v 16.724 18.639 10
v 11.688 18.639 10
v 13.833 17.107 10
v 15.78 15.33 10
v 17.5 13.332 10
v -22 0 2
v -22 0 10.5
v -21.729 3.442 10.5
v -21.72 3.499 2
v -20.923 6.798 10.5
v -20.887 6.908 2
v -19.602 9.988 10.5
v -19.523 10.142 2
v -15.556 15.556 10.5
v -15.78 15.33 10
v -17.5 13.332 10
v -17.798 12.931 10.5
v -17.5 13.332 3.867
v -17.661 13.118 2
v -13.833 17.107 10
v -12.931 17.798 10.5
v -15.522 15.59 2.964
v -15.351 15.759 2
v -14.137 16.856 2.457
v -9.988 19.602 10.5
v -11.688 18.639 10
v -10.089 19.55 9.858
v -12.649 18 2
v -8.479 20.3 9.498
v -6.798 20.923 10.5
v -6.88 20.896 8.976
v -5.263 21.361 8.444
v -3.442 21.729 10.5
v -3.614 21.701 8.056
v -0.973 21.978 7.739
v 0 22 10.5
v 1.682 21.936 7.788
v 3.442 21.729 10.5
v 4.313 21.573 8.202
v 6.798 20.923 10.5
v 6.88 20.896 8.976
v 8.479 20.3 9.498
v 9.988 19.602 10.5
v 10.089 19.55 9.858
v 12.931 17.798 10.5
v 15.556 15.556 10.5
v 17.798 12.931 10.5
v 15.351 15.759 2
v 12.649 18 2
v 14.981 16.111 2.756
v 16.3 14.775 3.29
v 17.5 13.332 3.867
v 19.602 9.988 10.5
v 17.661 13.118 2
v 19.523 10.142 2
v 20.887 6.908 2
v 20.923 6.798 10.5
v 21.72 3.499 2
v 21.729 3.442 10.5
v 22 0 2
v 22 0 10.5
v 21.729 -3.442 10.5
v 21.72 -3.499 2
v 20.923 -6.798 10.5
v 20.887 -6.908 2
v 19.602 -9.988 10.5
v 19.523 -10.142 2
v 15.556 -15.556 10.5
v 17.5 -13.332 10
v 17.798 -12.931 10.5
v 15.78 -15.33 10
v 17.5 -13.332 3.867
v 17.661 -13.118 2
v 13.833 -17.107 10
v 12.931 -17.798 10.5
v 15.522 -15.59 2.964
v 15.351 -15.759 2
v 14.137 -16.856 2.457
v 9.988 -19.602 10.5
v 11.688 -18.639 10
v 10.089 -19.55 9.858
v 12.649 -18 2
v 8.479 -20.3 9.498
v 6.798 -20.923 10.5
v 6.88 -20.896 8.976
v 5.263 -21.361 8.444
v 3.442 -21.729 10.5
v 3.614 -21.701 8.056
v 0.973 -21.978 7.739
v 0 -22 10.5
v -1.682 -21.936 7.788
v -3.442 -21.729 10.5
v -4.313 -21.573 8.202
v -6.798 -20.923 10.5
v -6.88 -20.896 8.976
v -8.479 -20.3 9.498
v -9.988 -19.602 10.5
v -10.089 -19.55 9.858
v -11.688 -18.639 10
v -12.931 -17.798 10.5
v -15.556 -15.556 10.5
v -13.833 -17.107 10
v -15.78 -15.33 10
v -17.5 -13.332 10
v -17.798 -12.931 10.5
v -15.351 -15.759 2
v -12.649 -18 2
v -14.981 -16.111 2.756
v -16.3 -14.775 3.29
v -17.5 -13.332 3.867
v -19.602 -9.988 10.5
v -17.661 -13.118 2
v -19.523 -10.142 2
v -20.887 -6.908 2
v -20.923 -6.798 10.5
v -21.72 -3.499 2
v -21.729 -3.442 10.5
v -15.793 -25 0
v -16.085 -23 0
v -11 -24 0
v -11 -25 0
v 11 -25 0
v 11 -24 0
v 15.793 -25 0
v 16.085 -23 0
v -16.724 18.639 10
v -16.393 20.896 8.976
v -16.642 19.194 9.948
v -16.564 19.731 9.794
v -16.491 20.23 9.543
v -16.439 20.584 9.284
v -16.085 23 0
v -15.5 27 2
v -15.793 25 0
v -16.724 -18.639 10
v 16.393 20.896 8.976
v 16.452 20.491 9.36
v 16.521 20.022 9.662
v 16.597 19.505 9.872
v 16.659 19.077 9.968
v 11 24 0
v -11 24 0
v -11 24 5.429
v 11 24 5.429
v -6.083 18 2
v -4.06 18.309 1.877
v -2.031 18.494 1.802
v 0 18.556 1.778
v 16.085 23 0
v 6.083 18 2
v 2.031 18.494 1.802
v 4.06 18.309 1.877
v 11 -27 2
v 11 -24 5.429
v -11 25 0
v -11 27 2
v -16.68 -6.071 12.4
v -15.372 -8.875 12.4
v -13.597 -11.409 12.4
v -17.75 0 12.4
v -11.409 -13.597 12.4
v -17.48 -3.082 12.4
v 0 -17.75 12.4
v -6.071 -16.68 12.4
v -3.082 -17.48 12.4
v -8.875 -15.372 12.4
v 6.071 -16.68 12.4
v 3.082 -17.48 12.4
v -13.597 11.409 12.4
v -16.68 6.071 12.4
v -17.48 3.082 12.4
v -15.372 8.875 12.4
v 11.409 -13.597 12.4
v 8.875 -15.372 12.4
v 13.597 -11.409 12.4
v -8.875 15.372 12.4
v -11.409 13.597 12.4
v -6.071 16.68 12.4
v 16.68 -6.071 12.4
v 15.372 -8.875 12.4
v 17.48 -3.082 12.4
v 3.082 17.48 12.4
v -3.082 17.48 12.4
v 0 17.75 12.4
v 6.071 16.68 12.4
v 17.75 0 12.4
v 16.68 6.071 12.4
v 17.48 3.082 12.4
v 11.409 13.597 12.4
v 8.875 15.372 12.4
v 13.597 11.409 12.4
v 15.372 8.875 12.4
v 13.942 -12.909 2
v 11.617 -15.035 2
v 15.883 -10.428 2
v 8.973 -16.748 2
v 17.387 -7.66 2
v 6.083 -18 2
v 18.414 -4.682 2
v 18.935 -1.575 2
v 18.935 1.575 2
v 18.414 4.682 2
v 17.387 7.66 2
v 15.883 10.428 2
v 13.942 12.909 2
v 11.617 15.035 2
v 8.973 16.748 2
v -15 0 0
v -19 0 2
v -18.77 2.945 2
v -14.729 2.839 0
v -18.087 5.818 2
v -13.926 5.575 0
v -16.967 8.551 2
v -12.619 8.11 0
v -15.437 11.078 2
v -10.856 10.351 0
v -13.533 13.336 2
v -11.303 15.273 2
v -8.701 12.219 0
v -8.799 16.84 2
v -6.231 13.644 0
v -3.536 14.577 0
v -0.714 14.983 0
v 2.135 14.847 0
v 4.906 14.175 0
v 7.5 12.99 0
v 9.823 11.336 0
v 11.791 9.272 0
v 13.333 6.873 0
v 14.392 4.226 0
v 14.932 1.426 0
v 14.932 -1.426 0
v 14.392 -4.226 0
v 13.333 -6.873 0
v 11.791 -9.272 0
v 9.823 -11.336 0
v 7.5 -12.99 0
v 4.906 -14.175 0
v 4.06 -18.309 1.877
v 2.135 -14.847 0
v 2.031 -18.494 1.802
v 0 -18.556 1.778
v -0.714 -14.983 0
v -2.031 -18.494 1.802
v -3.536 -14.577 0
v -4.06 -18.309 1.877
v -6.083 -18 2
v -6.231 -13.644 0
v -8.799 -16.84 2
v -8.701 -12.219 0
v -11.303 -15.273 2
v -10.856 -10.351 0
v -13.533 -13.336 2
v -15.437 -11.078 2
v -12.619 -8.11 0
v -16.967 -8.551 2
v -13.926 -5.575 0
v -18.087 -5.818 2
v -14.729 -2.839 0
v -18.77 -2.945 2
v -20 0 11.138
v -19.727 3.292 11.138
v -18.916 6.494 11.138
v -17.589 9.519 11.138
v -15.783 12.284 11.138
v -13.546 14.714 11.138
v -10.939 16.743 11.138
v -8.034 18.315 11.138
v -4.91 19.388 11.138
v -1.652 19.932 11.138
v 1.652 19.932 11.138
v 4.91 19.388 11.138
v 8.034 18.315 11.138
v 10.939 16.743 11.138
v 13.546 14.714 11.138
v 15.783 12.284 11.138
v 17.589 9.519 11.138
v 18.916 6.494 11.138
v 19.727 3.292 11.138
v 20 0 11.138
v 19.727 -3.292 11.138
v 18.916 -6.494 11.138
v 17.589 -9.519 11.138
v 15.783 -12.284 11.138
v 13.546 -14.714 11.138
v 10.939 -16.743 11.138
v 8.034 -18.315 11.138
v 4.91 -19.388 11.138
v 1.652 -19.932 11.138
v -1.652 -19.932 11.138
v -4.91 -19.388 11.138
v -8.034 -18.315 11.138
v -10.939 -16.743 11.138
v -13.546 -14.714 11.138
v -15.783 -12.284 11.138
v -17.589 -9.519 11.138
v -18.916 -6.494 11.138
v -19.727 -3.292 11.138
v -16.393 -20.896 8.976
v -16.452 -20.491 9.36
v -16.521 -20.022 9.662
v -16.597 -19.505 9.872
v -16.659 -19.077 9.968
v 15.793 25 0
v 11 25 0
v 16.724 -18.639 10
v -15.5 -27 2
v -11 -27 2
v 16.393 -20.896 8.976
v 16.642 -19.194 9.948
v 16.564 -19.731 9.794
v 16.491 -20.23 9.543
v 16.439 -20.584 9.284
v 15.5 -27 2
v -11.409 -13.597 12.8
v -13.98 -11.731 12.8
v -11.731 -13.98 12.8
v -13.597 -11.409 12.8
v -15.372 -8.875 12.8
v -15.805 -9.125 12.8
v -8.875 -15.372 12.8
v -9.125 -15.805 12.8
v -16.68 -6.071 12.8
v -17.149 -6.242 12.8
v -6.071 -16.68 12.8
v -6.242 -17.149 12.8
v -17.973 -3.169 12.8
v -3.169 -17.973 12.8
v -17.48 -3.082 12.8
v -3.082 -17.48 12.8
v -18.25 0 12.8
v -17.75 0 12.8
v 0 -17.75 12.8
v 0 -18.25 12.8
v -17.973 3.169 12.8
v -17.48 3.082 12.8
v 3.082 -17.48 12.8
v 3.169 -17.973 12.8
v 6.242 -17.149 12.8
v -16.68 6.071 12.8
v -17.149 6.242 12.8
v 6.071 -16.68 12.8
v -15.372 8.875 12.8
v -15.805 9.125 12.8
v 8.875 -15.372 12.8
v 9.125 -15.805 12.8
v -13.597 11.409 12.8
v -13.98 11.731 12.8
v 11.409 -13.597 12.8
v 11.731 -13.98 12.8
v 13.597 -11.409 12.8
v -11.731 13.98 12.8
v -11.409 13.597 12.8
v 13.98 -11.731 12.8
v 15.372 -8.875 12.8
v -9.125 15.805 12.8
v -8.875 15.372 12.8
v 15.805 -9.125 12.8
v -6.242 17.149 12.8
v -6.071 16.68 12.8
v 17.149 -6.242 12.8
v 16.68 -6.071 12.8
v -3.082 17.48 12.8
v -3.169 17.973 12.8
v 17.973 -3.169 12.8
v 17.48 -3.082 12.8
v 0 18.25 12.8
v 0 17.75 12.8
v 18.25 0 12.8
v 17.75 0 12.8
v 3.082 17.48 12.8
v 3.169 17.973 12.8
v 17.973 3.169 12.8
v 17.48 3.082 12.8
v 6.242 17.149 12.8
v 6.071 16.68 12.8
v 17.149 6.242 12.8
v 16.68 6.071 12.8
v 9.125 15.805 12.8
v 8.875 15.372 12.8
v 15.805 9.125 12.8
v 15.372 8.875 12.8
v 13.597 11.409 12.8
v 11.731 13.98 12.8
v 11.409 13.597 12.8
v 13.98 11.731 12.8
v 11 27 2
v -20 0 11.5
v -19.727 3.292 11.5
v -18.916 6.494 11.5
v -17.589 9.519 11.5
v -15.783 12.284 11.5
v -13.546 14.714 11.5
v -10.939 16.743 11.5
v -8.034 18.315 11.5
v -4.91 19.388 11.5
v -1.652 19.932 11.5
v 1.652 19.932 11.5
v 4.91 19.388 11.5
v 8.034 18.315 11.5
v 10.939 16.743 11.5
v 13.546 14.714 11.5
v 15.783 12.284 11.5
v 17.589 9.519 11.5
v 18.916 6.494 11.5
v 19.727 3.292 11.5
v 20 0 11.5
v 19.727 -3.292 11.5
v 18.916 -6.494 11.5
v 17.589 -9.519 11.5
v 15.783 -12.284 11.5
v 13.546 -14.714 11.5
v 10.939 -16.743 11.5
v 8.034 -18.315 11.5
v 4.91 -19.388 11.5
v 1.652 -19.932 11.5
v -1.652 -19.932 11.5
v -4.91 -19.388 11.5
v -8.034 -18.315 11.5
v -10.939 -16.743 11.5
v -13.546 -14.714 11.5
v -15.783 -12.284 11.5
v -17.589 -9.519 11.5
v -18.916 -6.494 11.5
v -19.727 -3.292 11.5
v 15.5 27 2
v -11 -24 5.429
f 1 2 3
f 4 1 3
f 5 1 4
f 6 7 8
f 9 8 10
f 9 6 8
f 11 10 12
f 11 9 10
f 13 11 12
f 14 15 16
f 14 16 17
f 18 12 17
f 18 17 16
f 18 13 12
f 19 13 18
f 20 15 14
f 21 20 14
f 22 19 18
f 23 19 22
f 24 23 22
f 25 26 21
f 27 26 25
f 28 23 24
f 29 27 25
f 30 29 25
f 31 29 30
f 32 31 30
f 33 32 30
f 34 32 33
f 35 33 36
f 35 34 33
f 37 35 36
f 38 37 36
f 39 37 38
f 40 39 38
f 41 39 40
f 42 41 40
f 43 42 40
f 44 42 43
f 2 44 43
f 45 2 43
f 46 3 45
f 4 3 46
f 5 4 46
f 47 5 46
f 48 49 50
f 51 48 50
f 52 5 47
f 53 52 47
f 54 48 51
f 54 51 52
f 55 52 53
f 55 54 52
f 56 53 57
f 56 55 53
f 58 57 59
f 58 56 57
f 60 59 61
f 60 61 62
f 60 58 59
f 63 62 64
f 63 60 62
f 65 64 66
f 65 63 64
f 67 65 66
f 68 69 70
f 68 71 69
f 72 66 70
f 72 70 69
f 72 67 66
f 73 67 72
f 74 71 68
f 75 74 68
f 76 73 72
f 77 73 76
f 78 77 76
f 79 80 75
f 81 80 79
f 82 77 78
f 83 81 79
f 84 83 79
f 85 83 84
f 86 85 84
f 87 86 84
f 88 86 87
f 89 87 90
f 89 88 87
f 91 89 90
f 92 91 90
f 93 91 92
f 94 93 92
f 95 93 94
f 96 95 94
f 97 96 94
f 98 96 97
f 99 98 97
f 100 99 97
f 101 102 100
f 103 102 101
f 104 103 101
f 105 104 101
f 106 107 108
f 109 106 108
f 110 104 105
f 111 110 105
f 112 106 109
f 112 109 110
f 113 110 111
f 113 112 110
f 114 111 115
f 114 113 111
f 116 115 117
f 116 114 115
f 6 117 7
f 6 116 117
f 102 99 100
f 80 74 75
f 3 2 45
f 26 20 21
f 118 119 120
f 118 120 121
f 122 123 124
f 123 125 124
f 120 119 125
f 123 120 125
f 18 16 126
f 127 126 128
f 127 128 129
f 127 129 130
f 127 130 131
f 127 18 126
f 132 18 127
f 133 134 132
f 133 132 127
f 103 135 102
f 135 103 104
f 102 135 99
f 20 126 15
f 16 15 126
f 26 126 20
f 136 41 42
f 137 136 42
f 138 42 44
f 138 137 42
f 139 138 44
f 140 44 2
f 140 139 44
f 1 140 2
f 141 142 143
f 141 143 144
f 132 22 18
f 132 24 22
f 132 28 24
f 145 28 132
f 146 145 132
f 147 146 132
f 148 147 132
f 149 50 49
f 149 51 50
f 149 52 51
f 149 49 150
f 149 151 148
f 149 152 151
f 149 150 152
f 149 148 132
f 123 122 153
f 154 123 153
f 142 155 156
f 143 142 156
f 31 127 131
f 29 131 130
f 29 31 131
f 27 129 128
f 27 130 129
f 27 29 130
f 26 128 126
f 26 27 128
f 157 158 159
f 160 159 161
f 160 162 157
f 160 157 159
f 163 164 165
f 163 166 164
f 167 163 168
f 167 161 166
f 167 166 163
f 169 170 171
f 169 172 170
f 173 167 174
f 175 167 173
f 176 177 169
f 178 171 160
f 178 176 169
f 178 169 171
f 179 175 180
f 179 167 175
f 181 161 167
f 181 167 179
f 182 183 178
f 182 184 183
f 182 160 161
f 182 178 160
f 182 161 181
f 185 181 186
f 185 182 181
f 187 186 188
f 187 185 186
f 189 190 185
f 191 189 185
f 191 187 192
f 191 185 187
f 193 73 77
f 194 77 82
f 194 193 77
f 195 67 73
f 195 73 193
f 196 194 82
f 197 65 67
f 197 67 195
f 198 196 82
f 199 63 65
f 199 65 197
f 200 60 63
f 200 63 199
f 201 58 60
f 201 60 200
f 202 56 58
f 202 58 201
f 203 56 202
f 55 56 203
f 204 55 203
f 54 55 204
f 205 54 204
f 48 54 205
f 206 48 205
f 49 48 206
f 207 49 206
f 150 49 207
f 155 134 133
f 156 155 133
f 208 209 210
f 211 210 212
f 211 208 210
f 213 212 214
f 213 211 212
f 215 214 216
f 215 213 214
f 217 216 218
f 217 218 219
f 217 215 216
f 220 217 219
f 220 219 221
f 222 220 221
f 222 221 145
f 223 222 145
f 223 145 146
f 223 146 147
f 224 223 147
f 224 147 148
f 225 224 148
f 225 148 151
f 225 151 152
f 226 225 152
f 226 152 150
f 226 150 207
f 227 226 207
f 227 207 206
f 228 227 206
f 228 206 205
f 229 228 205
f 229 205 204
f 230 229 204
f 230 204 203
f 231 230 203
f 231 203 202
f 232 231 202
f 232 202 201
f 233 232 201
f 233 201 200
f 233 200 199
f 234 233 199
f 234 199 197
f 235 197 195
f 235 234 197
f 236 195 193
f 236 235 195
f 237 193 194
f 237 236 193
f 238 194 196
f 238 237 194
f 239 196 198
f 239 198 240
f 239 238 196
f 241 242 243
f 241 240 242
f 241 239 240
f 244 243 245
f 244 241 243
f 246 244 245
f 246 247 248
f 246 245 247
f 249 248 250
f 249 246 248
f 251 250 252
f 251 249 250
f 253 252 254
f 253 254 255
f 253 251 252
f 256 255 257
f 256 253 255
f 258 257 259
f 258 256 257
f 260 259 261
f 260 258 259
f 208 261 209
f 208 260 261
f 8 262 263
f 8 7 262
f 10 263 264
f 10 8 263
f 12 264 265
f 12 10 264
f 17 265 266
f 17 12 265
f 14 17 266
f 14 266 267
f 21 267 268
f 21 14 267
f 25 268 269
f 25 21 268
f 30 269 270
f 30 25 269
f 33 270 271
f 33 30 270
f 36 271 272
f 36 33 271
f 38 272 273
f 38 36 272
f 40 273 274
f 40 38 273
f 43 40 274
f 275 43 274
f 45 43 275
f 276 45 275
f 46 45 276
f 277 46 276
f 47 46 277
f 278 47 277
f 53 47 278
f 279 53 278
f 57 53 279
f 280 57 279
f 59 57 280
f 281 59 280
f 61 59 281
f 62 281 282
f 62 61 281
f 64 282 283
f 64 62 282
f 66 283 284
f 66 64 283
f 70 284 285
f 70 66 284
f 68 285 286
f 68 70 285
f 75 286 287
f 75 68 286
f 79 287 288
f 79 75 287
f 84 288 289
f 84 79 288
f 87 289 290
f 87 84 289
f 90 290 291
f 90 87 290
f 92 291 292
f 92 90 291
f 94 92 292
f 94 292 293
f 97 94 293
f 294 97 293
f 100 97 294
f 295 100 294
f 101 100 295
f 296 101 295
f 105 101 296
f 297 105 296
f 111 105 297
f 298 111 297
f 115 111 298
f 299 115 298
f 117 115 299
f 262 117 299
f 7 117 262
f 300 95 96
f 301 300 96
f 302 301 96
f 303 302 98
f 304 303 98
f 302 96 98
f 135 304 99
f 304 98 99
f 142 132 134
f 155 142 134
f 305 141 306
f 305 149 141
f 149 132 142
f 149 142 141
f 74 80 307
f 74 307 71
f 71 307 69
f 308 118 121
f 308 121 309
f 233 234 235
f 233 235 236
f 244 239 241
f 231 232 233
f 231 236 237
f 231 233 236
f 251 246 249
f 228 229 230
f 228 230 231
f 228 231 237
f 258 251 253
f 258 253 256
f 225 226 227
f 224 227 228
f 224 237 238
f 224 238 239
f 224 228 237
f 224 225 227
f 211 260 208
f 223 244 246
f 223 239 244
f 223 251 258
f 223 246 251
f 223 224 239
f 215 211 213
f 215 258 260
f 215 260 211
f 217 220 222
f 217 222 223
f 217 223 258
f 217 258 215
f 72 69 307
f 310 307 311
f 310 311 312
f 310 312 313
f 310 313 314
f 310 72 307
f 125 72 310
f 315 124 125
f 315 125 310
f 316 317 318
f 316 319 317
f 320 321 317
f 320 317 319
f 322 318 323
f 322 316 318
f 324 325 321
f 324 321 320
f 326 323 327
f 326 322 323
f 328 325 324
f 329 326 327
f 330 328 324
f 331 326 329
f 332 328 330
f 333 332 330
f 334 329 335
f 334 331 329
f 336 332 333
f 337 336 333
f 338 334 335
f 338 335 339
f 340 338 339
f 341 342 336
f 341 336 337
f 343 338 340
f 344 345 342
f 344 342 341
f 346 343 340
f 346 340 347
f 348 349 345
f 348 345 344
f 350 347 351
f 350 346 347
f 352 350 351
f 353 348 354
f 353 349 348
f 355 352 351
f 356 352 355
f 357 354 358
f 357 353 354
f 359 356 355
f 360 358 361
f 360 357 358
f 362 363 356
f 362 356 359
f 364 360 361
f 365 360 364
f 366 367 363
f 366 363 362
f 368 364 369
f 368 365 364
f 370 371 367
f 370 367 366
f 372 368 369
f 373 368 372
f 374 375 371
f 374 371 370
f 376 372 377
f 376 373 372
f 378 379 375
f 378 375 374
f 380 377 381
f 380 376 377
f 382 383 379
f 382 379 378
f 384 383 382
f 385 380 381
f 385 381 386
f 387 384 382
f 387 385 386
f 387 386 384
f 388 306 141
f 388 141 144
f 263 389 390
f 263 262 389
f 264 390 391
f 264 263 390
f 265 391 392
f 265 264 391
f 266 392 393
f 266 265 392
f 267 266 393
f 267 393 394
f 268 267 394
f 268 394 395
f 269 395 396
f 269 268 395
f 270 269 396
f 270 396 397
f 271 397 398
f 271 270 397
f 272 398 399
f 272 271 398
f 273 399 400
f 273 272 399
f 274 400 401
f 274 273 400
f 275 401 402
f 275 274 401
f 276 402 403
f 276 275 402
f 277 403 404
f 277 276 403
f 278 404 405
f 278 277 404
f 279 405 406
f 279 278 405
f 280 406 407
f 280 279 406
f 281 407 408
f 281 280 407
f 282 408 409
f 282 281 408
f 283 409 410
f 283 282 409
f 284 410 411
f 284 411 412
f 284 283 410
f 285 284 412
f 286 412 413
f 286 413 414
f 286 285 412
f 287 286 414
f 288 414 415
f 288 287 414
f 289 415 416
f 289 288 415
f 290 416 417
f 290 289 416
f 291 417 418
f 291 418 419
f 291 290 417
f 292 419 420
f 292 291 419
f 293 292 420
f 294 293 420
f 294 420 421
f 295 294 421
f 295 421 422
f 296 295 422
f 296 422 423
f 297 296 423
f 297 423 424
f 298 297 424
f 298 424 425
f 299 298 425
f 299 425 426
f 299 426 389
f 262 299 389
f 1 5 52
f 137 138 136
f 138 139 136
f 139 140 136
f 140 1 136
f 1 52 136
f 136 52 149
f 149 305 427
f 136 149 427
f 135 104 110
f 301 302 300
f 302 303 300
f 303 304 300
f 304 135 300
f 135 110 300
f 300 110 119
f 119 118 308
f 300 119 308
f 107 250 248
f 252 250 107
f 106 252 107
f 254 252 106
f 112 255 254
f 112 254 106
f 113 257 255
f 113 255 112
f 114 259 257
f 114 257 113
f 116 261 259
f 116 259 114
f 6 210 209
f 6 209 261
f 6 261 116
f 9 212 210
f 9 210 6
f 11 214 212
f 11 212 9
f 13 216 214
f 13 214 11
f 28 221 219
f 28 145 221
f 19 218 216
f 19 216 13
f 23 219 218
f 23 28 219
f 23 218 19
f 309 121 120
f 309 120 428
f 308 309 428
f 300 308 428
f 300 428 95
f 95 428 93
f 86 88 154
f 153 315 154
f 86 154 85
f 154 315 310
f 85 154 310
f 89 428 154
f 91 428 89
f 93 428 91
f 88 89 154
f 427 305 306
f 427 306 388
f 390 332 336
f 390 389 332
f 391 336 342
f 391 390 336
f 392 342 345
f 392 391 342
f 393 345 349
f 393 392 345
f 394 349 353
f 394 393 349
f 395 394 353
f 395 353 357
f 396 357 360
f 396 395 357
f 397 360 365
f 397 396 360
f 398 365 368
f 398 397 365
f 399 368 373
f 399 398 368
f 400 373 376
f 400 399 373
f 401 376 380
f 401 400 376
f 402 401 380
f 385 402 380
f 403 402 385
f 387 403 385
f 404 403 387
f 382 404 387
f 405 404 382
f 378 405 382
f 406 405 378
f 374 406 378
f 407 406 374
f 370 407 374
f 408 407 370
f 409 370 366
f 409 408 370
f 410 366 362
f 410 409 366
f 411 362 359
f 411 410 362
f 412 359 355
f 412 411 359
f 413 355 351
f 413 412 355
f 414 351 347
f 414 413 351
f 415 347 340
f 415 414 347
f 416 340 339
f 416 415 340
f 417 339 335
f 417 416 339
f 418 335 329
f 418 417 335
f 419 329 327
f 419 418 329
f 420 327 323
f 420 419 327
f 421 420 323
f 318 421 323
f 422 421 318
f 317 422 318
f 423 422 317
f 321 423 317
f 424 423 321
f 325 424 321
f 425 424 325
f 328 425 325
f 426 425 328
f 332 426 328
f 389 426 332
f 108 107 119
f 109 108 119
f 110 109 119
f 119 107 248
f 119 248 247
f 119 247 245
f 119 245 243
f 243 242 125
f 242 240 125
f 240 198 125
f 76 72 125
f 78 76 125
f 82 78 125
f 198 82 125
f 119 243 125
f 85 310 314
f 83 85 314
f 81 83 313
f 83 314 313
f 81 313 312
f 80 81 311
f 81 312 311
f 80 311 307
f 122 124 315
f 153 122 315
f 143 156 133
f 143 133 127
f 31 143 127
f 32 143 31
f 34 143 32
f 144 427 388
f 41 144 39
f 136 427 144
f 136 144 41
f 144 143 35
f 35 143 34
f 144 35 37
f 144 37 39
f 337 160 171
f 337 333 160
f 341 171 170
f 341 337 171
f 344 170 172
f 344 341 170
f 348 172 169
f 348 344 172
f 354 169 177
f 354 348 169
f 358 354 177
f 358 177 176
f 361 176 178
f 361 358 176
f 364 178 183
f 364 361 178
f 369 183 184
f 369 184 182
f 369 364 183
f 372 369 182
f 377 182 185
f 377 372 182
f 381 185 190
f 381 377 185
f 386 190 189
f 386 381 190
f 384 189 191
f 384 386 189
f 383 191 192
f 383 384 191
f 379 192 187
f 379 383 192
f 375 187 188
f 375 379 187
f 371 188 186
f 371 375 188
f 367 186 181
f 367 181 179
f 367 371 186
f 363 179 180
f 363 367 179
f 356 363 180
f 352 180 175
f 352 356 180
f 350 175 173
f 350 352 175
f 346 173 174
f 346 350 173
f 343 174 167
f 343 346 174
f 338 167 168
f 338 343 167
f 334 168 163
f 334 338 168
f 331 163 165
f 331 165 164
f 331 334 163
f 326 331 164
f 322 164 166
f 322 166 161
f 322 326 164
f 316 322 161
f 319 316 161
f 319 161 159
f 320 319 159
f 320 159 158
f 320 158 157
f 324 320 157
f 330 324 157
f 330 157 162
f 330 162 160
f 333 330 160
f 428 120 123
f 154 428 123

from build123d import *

# Parameters (mm, degrees)
F3_DEPTH         = 17.5
F5_DEPTH         = 12.801
F5_COPIES2_COUNT = 2
F6_W             = 22
F6_H             = 3
F7_DEPTH         = 12.801


# Not quite as in the source:
# - a pattern or mirror of a feature is missing from the dataset's text; its kind, count and spacing are read off the source's solid


with BuildPart() as f1:
    # F0 (on Front) → F1 (revolve)
    with BuildSketch(Plane.XZ):
        Polygon((-15, 0), (0, 0), (0, 12.4), (-17.75, 12.4), (-17.75, 12.8), (-18.25, 12.8), (-20, 11.5), (-20, 11.1382370815), (-22, 10.5), (-22, 2), (-19, 2), align=None)
    revolve(axis=Axis((0, 0, 3.4052523688), (0, 0, -1)))

    # F2 (on Right) → F3 (join, symmetric)
    with BuildSketch(Plane.YZ):
        with BuildLine():
            Line((23, 0), (25, 0))
            Line((25, 0), (27, 2))
            Line((27, 2), (20.8964254043, 8.9755138236))
            ThreePointArc((20.8964254043, 8.9755138236), (19.8783441675, 9.7318987418), (18.6386953202, 10))
            Line((18.6386953202, 10), (13, 10))
            Line((13, 10), (13, 4))
            Line((13, 4), (23, 0))
        make_face()
    f3 = extrude(amount=F3_DEPTH, both=True)

    # F3_copies: F3 across plane
    add(f3.mirror(Plane(origin=(0, 0, 0), x_dir=(0, 0, -1), z_dir=(0, -1, 0))))

    # F4 (on Top) → F5 (cut, through all)
    with BuildSketch(Plane.XY):
        Polygon((-17.5, 27), (-17.5, 13.332291626), (-15.5, 27), align=None)
    f5 = extrude(amount=F5_DEPTH, mode=Mode.SUBTRACT)

    # F5_copies: F5 across plane
    add(f5.mirror(Plane(origin=(0, 0, 0), x_dir=(0, 0, 1), z_dir=(1, 0, 0))), mode=Mode.SUBTRACT)

    # F5_copies1: F5 across plane
    add(f5.mirror(Plane(origin=(0, 0, 0), x_dir=(0, 0, -1), z_dir=(0, -1, 0))), mode=Mode.SUBTRACT)

    # F5_copies2: F5 ×2 about axis
    f5_copies2_axis = Axis((0, 0, 0), (0, 0, 1))
    for i in range(1, F5_COPIES2_COUNT):
        add(f5.rotate(f5_copies2_axis, i * 360 / F5_COPIES2_COUNT), mode=Mode.SUBTRACT)

    # F6 (on Top) → F7 (cut, through all)
    with BuildSketch(Plane.XY):
        with Locations((0, 25.5)):
            Rectangle(F6_W, F6_H)
    f7 = extrude(amount=F7_DEPTH, mode=Mode.SUBTRACT)

    # F7_copies: F7 across plane
    add(f7.mirror(Plane(origin=(0, 0, 0), x_dir=(0, 0, -1), z_dir=(0, -1, 0))), mode=Mode.SUBTRACT)


solid = f1.part
